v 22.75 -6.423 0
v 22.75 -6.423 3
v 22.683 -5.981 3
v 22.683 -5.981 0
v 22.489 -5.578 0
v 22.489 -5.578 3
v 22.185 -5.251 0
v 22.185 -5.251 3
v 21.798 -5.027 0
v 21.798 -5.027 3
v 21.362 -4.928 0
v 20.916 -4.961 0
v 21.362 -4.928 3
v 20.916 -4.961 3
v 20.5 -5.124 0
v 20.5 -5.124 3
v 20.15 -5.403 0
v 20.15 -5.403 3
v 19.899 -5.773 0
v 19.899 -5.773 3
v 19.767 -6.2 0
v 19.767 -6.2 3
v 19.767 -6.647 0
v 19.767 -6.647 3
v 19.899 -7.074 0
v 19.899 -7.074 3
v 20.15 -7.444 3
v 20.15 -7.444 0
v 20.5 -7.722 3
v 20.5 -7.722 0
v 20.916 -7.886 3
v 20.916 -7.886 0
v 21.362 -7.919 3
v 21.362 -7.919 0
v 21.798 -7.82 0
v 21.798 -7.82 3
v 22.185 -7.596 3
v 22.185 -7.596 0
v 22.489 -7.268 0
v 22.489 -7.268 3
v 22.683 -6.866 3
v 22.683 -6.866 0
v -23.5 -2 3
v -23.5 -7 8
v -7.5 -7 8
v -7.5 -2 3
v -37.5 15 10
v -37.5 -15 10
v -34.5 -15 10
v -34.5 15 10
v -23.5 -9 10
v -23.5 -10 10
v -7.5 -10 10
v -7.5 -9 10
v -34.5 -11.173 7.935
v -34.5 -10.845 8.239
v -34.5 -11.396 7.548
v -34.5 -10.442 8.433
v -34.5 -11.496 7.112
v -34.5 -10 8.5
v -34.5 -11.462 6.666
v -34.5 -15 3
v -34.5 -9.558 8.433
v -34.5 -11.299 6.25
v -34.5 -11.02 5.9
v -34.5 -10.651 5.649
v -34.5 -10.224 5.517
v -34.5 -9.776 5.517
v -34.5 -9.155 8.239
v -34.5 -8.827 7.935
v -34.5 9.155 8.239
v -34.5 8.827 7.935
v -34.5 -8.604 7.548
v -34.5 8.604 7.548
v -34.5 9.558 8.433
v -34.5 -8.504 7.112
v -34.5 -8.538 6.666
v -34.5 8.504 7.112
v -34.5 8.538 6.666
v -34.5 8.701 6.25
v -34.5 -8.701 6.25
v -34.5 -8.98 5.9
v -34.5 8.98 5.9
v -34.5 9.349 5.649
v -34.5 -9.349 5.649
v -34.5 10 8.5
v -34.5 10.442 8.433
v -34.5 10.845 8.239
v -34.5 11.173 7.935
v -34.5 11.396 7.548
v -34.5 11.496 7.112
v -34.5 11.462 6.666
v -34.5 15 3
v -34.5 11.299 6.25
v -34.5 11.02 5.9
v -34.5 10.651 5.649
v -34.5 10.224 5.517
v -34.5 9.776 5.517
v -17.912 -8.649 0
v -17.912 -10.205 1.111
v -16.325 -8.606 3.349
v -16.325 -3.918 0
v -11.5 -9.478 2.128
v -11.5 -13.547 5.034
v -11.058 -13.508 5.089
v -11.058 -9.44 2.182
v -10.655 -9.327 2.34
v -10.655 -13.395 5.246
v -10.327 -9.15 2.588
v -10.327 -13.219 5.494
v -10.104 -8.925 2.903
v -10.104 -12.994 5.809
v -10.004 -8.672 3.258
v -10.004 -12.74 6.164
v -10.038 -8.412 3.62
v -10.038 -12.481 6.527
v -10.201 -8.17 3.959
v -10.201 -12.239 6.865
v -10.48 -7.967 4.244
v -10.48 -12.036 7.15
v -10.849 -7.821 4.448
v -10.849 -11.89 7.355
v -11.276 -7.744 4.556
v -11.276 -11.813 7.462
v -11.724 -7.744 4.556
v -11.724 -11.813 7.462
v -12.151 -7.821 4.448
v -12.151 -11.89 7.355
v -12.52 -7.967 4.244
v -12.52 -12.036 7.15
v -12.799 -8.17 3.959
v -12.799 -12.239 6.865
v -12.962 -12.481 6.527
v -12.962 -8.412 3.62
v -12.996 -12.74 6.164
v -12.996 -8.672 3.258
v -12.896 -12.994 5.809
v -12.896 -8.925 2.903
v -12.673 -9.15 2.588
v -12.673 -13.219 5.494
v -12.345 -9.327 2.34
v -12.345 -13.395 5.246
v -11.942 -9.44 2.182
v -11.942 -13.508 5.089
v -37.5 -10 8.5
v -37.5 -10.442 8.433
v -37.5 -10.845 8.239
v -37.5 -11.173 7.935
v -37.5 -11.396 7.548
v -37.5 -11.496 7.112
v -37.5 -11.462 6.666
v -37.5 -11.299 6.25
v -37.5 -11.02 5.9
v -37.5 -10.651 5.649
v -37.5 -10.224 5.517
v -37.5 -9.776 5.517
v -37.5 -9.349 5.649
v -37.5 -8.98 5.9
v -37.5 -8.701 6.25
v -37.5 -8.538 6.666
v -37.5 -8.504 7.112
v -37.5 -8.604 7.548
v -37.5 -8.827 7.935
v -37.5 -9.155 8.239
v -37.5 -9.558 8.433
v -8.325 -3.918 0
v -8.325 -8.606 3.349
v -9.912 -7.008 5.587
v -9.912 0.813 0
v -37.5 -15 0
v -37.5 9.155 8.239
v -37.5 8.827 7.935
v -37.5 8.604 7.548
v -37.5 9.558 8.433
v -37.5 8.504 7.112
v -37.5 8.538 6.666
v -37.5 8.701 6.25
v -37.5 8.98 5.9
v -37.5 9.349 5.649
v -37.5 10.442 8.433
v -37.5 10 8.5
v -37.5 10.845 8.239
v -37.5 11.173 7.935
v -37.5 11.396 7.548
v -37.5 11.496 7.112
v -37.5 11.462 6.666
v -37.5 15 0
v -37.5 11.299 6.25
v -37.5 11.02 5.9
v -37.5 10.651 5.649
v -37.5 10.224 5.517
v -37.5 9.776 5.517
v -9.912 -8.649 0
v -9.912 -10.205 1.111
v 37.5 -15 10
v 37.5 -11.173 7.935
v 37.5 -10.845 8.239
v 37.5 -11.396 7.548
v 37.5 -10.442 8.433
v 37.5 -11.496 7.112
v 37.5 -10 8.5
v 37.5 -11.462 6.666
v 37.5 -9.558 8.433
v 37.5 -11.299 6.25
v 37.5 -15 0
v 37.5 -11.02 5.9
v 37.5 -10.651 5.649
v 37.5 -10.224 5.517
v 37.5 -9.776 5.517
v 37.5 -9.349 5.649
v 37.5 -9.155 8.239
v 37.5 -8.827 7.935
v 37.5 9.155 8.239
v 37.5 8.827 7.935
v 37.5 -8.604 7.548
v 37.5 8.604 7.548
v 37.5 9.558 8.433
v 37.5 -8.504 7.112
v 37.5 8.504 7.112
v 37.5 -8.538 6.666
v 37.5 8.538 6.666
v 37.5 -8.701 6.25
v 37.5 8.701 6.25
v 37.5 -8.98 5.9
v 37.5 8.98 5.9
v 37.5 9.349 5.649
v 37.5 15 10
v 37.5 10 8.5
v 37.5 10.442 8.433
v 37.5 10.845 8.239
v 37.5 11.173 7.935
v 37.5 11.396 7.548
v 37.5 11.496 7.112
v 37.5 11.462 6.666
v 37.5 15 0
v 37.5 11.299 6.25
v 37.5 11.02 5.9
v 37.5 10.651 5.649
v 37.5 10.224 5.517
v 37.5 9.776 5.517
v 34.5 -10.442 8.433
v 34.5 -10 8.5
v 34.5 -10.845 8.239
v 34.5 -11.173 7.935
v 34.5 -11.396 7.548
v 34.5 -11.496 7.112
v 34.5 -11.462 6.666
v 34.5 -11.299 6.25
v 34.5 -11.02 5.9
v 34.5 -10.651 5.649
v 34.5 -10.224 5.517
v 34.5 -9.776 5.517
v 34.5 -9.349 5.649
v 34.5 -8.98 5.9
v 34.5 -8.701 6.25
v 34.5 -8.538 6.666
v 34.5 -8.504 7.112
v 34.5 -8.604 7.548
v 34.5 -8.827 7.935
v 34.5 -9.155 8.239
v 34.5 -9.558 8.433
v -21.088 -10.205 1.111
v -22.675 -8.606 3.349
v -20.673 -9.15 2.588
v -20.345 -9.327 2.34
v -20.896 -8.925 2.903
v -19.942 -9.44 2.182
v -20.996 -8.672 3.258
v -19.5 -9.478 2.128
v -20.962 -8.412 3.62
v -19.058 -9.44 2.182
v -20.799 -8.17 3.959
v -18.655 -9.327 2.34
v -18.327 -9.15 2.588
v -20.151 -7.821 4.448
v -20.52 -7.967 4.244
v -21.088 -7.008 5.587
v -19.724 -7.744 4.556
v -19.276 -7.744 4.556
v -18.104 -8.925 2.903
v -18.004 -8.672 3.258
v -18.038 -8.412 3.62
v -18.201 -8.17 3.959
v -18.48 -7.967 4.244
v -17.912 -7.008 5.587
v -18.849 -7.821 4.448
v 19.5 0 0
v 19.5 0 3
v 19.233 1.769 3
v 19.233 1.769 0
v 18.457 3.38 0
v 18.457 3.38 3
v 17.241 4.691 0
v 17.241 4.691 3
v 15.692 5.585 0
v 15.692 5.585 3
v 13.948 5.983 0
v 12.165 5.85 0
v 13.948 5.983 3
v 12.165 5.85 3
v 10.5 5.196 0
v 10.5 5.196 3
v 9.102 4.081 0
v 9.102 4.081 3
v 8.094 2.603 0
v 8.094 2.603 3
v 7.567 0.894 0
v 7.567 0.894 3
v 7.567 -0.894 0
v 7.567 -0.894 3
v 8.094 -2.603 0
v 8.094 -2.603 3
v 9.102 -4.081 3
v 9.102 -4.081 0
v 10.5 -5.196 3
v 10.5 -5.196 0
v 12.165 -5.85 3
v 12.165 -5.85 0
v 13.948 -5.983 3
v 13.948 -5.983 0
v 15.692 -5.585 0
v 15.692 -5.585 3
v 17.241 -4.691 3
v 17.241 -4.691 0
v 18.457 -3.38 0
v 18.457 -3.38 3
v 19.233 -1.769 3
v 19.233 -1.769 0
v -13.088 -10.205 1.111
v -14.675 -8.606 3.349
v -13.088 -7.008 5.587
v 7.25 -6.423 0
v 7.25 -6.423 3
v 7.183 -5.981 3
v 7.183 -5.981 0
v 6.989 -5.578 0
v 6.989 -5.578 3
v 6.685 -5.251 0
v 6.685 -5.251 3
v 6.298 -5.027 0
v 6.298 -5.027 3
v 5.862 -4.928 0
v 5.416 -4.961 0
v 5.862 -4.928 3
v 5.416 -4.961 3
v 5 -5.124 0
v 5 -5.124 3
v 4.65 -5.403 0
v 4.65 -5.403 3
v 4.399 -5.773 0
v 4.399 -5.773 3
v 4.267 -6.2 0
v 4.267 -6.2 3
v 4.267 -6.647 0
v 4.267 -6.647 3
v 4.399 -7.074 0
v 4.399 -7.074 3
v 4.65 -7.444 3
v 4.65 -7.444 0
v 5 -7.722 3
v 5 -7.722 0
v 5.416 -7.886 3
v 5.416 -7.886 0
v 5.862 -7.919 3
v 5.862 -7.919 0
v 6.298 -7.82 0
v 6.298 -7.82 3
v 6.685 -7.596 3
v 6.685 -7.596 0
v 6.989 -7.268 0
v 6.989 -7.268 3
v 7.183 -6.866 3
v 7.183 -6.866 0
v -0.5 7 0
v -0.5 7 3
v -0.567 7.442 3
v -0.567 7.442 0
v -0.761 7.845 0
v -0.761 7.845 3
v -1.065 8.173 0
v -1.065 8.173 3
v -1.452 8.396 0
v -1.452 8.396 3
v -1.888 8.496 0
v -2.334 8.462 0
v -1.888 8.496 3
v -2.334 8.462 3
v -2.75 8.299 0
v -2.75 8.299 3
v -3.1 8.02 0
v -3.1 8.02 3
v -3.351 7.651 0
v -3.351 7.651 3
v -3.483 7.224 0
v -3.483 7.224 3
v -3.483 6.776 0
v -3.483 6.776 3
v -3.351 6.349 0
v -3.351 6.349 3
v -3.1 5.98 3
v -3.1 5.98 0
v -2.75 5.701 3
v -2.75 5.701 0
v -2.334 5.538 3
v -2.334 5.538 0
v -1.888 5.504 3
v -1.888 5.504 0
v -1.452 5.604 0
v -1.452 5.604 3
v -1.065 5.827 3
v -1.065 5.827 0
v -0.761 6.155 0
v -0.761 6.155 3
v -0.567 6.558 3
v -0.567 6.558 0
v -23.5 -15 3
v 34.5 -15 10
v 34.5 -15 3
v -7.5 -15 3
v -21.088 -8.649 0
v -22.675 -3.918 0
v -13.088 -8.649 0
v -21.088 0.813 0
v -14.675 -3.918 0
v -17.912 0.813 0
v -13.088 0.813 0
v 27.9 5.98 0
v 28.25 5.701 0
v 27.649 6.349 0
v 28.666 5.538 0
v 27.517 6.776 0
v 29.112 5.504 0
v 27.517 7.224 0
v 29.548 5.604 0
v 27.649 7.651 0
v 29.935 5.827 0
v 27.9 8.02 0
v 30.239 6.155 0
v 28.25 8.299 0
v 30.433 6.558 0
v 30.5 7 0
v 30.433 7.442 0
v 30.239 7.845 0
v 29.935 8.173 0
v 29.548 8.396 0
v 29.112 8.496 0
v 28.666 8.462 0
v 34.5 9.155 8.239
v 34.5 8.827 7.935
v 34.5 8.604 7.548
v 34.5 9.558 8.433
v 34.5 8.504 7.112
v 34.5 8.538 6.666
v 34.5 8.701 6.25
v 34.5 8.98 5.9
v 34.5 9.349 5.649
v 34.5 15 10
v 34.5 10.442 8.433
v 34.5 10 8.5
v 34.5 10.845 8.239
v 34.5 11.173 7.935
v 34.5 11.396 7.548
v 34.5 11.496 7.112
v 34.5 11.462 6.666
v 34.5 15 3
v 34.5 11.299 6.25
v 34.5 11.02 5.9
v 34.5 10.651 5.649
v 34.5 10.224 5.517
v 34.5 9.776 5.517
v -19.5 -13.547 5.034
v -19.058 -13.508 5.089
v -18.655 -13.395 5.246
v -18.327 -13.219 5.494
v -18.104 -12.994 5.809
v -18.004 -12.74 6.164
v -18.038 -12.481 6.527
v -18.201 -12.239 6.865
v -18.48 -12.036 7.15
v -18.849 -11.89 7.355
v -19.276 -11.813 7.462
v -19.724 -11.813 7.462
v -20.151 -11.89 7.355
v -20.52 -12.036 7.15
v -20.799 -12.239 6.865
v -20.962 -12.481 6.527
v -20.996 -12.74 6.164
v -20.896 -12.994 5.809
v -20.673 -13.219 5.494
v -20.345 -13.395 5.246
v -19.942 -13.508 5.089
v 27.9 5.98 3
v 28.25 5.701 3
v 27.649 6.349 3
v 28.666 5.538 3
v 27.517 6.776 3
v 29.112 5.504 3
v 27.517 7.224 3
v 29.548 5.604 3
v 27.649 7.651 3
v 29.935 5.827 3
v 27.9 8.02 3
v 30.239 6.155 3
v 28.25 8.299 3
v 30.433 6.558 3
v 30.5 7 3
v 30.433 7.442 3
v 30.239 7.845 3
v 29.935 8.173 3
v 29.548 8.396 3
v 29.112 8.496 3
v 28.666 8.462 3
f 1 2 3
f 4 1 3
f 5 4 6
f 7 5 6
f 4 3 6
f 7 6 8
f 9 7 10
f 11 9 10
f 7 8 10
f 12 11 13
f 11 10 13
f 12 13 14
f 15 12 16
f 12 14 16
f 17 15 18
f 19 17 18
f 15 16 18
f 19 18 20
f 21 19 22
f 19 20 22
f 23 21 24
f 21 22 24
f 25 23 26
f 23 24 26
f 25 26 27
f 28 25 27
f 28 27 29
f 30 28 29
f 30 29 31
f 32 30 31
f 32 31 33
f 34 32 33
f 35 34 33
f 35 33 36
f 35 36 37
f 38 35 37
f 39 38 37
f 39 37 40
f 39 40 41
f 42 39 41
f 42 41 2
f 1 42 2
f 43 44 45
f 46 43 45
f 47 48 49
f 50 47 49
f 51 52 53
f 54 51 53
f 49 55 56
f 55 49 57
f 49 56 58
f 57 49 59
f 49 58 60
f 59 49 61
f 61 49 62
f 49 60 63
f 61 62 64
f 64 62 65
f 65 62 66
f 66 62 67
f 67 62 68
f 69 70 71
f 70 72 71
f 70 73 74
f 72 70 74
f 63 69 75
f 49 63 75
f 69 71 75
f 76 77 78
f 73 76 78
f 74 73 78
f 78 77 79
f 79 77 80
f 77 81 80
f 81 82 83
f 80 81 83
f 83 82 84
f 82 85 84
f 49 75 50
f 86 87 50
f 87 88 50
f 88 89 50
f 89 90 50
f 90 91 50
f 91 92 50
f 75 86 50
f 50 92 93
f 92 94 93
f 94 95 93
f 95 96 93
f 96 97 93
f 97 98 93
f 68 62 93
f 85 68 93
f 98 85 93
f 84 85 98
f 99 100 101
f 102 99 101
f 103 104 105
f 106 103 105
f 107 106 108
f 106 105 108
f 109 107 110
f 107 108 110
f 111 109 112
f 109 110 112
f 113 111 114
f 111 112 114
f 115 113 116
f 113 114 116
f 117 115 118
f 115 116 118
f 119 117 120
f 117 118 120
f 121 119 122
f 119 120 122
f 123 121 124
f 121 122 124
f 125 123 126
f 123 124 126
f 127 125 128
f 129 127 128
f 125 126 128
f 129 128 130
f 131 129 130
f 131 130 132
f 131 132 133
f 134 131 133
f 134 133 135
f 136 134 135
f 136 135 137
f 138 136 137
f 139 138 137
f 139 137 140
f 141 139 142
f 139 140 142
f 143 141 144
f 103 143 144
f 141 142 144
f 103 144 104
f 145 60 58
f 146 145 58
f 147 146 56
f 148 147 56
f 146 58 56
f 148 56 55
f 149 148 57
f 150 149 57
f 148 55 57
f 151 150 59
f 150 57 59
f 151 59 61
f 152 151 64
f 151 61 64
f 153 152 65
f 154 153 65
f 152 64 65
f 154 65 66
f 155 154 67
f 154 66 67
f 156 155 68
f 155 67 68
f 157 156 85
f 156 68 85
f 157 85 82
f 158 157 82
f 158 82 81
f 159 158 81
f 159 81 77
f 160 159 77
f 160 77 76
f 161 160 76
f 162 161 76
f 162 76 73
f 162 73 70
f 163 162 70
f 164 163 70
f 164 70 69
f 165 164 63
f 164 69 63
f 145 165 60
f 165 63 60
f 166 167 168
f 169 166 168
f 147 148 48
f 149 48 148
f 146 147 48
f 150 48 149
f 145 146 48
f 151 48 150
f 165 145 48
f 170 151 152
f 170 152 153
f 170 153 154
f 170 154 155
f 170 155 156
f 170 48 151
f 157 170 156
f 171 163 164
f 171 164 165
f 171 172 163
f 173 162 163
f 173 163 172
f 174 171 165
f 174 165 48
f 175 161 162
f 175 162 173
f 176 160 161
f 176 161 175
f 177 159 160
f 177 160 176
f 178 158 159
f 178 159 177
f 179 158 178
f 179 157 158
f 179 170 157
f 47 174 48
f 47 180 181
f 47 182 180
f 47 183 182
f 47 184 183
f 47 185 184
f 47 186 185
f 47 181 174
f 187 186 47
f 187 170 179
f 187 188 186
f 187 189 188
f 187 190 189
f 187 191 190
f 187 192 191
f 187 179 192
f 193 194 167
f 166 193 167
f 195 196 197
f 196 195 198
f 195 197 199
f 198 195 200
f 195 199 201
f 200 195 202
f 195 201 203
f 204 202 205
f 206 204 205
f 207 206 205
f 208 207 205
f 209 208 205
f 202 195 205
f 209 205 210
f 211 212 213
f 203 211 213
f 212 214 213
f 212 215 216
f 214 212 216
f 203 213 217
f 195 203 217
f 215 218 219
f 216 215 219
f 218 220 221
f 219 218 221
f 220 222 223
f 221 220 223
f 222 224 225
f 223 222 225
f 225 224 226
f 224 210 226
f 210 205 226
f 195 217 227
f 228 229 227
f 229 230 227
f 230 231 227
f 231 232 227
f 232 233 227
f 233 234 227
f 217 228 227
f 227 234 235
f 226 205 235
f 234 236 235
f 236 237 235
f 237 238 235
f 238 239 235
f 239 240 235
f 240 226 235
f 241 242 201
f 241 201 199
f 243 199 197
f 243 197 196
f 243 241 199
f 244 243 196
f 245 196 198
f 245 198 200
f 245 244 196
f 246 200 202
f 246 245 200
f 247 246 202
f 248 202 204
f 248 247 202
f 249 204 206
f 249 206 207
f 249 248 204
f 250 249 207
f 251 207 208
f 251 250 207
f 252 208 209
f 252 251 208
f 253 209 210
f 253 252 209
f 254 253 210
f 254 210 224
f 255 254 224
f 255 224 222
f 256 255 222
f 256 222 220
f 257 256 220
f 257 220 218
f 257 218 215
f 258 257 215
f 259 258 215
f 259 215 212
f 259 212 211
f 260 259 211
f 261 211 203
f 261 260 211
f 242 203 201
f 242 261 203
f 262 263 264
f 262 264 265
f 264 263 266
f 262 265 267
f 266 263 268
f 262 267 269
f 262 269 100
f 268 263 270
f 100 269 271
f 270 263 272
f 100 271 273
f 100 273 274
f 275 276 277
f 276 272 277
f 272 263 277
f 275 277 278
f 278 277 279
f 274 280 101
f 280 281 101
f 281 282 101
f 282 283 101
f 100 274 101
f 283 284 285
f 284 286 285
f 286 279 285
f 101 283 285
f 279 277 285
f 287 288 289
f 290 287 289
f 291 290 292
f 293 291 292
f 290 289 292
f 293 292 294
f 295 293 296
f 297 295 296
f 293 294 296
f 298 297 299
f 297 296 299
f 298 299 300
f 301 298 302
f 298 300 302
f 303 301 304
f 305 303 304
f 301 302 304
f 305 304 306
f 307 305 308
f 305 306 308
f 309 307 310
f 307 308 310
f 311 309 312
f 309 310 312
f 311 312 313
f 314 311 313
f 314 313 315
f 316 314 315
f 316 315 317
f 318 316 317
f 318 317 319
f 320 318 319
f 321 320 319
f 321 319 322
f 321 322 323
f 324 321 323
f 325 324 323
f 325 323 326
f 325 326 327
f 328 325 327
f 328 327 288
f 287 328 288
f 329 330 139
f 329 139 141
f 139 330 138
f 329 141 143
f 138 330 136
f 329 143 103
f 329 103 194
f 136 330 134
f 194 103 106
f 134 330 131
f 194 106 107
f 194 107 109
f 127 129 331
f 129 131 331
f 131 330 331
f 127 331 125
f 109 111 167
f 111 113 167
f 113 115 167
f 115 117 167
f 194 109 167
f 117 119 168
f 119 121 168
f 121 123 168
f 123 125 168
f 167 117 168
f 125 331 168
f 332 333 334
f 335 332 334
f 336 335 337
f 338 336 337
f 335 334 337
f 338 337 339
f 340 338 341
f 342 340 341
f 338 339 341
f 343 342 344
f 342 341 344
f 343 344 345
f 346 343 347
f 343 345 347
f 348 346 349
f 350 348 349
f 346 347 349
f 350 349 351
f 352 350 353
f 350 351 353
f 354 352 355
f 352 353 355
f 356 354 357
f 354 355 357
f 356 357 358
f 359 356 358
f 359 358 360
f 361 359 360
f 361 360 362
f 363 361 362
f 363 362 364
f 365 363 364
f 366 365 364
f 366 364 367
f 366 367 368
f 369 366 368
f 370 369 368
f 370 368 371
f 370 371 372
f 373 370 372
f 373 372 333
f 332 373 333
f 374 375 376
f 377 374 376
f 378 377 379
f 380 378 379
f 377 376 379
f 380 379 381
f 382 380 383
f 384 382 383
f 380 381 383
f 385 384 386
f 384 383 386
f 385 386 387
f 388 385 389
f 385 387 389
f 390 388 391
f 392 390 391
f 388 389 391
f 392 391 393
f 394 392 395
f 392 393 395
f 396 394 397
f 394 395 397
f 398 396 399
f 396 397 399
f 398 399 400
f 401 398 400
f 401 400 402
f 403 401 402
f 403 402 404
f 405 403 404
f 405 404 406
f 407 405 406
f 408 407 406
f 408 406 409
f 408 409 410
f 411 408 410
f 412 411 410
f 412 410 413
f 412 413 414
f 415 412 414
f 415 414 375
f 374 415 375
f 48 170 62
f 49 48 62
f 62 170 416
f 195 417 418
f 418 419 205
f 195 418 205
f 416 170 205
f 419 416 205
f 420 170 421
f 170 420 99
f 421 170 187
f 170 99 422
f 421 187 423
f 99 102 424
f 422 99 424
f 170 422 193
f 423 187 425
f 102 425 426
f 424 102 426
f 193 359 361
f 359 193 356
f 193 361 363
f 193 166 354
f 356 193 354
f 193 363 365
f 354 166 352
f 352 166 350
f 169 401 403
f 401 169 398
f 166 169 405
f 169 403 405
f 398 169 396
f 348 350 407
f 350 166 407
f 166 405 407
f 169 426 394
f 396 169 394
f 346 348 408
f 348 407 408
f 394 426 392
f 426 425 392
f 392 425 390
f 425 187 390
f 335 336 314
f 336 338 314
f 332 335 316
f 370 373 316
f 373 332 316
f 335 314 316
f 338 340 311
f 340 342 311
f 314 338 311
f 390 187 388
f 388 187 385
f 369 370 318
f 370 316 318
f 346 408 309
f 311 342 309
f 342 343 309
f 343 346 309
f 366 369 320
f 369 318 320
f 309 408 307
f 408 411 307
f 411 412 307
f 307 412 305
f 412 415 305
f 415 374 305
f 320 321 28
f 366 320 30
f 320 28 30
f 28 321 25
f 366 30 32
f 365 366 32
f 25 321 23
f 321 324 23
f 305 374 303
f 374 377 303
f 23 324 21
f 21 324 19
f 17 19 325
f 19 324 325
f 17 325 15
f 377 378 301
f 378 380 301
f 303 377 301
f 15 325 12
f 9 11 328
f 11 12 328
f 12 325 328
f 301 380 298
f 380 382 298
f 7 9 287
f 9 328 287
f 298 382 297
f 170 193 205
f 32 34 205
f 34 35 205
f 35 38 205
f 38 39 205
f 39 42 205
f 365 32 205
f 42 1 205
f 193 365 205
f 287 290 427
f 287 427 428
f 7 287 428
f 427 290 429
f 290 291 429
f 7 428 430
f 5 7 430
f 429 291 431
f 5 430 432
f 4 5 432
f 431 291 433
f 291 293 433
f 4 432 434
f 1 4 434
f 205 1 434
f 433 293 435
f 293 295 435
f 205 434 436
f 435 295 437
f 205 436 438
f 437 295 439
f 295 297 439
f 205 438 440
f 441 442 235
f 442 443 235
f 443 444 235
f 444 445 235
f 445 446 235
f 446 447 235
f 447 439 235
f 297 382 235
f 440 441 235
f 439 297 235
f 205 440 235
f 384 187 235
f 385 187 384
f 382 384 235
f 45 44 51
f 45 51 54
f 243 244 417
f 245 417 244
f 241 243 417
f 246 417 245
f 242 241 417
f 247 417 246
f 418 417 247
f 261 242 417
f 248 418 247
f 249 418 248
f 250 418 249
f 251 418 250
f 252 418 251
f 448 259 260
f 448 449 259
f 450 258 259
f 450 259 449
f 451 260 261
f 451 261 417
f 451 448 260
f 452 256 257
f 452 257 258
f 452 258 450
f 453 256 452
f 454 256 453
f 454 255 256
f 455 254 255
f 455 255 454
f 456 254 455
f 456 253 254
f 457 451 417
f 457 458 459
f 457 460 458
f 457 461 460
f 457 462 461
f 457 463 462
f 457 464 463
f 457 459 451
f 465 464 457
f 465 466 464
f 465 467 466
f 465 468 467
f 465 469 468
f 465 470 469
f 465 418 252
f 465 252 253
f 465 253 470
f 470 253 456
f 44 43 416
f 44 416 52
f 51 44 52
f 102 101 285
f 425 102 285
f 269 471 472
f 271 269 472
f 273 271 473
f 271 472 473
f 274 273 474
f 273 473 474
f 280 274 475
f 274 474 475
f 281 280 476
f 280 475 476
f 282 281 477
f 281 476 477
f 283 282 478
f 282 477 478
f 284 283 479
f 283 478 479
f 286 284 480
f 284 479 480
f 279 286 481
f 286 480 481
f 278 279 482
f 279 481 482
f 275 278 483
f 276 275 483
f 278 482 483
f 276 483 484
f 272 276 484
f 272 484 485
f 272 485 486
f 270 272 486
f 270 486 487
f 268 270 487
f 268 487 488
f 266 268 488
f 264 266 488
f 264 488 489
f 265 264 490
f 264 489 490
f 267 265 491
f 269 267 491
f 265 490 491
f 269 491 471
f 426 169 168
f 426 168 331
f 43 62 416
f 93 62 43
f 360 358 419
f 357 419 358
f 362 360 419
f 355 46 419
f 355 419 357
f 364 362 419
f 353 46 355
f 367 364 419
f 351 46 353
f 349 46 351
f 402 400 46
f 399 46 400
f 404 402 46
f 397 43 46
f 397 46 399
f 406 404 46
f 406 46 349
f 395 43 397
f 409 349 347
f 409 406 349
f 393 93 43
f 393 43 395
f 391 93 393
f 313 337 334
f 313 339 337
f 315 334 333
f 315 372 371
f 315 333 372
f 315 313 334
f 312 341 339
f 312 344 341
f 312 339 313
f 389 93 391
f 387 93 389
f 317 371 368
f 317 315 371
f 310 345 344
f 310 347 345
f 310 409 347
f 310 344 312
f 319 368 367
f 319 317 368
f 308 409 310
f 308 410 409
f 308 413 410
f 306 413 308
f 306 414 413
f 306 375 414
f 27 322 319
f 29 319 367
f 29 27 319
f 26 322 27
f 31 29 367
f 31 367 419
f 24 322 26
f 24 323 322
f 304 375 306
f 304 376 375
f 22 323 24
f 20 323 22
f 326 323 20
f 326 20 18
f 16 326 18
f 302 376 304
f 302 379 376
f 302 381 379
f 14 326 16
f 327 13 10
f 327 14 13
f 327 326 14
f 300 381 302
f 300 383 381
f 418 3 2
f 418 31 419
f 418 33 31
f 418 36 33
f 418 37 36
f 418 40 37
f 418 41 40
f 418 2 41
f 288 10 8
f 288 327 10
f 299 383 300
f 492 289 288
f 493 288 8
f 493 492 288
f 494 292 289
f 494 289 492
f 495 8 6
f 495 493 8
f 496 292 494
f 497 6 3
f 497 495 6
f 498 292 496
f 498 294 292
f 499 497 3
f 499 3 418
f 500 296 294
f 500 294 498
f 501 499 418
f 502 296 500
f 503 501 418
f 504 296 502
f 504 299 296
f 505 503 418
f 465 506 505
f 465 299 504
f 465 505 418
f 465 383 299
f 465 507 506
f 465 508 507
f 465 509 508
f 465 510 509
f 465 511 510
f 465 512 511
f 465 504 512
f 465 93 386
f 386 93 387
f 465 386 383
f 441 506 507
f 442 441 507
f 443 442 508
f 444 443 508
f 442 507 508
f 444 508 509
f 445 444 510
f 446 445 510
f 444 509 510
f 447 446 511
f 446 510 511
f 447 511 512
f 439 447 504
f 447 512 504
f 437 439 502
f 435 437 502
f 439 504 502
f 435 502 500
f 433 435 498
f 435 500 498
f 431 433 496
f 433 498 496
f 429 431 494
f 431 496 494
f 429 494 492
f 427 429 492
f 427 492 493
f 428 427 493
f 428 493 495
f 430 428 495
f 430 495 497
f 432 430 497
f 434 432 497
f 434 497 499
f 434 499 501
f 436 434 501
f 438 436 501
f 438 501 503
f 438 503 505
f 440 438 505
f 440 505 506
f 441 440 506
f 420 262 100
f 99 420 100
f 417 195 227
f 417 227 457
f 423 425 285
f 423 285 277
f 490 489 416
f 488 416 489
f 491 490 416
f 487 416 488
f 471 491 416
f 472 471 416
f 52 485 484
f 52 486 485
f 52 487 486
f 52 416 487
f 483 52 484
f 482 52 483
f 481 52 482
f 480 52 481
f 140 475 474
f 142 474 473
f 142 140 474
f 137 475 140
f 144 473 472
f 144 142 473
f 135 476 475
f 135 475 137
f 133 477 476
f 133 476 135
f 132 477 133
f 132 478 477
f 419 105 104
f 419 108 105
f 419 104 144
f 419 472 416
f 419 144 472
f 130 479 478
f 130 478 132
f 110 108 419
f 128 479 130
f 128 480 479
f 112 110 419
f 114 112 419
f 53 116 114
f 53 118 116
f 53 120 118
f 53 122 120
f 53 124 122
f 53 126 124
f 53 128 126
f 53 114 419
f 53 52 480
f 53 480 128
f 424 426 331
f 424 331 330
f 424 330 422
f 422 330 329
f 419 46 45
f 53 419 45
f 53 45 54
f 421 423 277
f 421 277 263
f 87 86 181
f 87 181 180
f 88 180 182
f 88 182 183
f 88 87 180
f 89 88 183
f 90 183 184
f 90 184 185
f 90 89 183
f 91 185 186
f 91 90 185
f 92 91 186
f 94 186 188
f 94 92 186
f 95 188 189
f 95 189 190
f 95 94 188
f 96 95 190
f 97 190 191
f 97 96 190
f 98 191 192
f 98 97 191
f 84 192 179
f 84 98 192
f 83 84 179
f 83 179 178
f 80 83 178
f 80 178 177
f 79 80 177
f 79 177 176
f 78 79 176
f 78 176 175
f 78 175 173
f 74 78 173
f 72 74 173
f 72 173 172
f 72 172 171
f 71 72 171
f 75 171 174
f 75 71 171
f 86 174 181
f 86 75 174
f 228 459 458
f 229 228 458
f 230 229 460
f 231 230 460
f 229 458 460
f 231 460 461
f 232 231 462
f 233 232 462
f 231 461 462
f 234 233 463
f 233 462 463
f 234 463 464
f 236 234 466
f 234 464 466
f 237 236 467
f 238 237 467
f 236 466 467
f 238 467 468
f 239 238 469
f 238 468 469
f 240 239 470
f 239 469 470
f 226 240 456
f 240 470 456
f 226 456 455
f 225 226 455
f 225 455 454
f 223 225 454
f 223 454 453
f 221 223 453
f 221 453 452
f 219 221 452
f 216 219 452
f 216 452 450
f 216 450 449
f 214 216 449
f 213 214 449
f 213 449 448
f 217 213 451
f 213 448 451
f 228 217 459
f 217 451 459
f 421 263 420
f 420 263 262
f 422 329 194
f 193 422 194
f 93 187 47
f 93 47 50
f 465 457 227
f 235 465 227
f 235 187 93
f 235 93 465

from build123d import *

# Parameters (mm, degrees)
SKETCH1_W               = 75
SKETCH1_H               = 30
BOSS_EXTRUDE1_DEPTH     = 3
SKETCH2_W               = 3
SKETCH2_H               = 30
BOSS_EXTRUDE2_DEPTH     = 10
SKETCH4_R               = 1.5
CUT_EXTRUDE1_DEPTH      = 3
MIRROR1_COPY_1_SKETCH_R = 1.5
MIRROR1_COPY_1_DEPTH    = 3
SKETCH5_R               = 6
SKETCH5_R_2             = 1.5
CUT_EXTRUDE2_DEPTH      = 10
SKETCH6_W               = 16
SKETCH6_H               = 7
BOSS_EXTRUDE3_DEPTH     = 8
CHAMFER1_SIZE           = 7
CHAMFER1_SIZE2          = 5
SKETCH7_R               = 1.5
CUT_EXTRUDE3_DEPTH      = 5
CHAMFER2_SIZE           = 5
CHAMFER3_SIZE           = 2
CUT_EXTRUDE4_START      = -5
CUT_EXTRUDE4_DEPTH      = 42.544442581


with BuildPart() as part:
    # Sketch1 → Boss-Extrude1 (new body)
    with BuildSketch(Plane.XY):
        Rectangle(SKETCH1_W, SKETCH1_H)
    extrude(amount=BOSS_EXTRUDE1_DEPTH)

    # Sketch2 → Boss-Extrude2 (add)
    with BuildSketch(Plane(origin=(0, 0, 0), x_dir=(-1, 0, 0), z_dir=(0, 0, -1))):
        with Locations((-36, 0)):
            Rectangle(SKETCH2_W, SKETCH2_H)
    boss_extrude2 = extrude(amount=-BOSS_EXTRUDE2_DEPTH)

    # Sketch4 → Cut-Extrude1 (cut)
    with BuildSketch(Plane.ZY.offset(-34.5)):
        with Locations((7, 10)):
            Circle(SKETCH4_R)
    cut_extrude1 = extrude(amount=-CUT_EXTRUDE1_DEPTH, mode=Mode.SUBTRACT)

    # Mirror2: Cut-Extrude1 across plane
    add(cut_extrude1.mirror(Plane.ZX), mode=Mode.SUBTRACT)

    # Mirror1: Boss-Extrude2, Cut-Extrude1 across plane
    add(boss_extrude2.mirror(Plane(origin=(0, 0, 0), x_dir=(0, 0, 1), z_dir=(1, 0, 0))))
    add(cut_extrude1.mirror(Plane(origin=(0, 0, 0), x_dir=(0, 0, 1), z_dir=(1, 0, 0))), mode=Mode.SUBTRACT)

    # Mirror1 copy 1 sketch → Mirror1 copy 1 (cut)
    with BuildSketch(Plane(origin=(-34.5, 0, 0), x_dir=(0, 0, 1), z_dir=(1, 0, 0))):
        with Locations((7, 10)):
            Circle(MIRROR1_COPY_1_SKETCH_R)
    extrude(amount=-MIRROR1_COPY_1_DEPTH, mode=Mode.SUBTRACT)

    # Sketch5 → Cut-Extrude2 (cut)
    with BuildSketch(Plane.XY.offset(3)):
        with Locations((13.5, 0)):
            Circle(SKETCH5_R)
        with Locations((29, 7)):
            Circle(SKETCH5_R_2)
        with Locations((21.25, -6.423393759)):
            Circle(SKETCH5_R_2)
        with Locations((5.75, -6.423393759)):
            Circle(SKETCH5_R_2)
        with Locations((-2, 7)):
            Circle(SKETCH5_R_2)
    extrude(amount=-CUT_EXTRUDE2_DEPTH, mode=Mode.SUBTRACT)

    # Sketch6 → Boss-Extrude3 (add)
    with BuildSketch(Plane.XZ.offset(15)):
        with Locations((-15.5, 6.5)):
            Rectangle(SKETCH6_W, SKETCH6_H)
    extrude(amount=-BOSS_EXTRUDE3_DEPTH)

    # Chamfer1
    chamfer1_edges = [part.edges().sort_by_distance(p)[0] for p in [
        (-15.5, -15, 10),
    ]]
    chamfer1_side = [part.faces().sort_by_distance(p)[0] for p in [
        (0, -15, 0.756637298),
    ]]
    chamfer(chamfer1_edges, length=CHAMFER1_SIZE, length2=CHAMFER1_SIZE2, reference=chamfer1_side[0])

    # Sketch7 → Cut-Extrude3 (cut)
    with BuildSketch(Plane(origin=(0, -11.351351351, 8.108108108), x_dir=(1, 0, 0), z_dir=(0, -0.8137334712067348, 0.5812381937190968))):
        with Locations(Location((-19.5, -2.277372492, 0), (0, 0, 270))):
            Circle(SKETCH7_R)
        with Locations(Location((-11.5, -2.277372492, 0), (0, 0, 270))):
            Circle(SKETCH7_R)
    extrude(amount=-CUT_EXTRUDE3_DEPTH, mode=Mode.SUBTRACT)

    # Chamfer2
    chamfer2_edges = [part.edges().sort_by_distance(p)[0] for p in [
        (-15.5, -7, 3),
    ]]
    chamfer(chamfer2_edges, length=CHAMFER2_SIZE)

    # Chamfer3
    chamfer3_edges = [part.edges().sort_by_distance(p)[0] for p in [
        (-15.5, -7, 10),
    ]]
    chamfer(chamfer3_edges, length=CHAMFER3_SIZE - 0.0001)  # a hair under: the kernel refuses the full size

    # Sketch8 → Cut-Extrude4 (cut, through all)
    with BuildSketch(Plane(origin=(0, -11.351351351, 8.108108108), x_dir=(1, 0, 0), z_dir=(0, -0.8137334712067347, 0.5812381937190967)).offset(CUT_EXTRUDE4_START)):
        Polygon((-16.324573519, -2.277372492), (-17.91228676, 0.472627508), (-21.08771324, 0.472627508), (-22.675426481, -2.277372492), (-21.08771324, -5.027372492), (-17.91228676, -5.027372492), align=None)
        Polygon((-8.324573519, -2.277372492), (-9.91228676, 0.472627508), (-13.08771324, 0.472627508), (-14.675426481, -2.277372492), (-13.08771324, -5.027372492), (-9.91228676, -5.027372492), align=None)
    extrude(amount=-CUT_EXTRUDE4_DEPTH, mode=Mode.SUBTRACT)


solid = part.part
